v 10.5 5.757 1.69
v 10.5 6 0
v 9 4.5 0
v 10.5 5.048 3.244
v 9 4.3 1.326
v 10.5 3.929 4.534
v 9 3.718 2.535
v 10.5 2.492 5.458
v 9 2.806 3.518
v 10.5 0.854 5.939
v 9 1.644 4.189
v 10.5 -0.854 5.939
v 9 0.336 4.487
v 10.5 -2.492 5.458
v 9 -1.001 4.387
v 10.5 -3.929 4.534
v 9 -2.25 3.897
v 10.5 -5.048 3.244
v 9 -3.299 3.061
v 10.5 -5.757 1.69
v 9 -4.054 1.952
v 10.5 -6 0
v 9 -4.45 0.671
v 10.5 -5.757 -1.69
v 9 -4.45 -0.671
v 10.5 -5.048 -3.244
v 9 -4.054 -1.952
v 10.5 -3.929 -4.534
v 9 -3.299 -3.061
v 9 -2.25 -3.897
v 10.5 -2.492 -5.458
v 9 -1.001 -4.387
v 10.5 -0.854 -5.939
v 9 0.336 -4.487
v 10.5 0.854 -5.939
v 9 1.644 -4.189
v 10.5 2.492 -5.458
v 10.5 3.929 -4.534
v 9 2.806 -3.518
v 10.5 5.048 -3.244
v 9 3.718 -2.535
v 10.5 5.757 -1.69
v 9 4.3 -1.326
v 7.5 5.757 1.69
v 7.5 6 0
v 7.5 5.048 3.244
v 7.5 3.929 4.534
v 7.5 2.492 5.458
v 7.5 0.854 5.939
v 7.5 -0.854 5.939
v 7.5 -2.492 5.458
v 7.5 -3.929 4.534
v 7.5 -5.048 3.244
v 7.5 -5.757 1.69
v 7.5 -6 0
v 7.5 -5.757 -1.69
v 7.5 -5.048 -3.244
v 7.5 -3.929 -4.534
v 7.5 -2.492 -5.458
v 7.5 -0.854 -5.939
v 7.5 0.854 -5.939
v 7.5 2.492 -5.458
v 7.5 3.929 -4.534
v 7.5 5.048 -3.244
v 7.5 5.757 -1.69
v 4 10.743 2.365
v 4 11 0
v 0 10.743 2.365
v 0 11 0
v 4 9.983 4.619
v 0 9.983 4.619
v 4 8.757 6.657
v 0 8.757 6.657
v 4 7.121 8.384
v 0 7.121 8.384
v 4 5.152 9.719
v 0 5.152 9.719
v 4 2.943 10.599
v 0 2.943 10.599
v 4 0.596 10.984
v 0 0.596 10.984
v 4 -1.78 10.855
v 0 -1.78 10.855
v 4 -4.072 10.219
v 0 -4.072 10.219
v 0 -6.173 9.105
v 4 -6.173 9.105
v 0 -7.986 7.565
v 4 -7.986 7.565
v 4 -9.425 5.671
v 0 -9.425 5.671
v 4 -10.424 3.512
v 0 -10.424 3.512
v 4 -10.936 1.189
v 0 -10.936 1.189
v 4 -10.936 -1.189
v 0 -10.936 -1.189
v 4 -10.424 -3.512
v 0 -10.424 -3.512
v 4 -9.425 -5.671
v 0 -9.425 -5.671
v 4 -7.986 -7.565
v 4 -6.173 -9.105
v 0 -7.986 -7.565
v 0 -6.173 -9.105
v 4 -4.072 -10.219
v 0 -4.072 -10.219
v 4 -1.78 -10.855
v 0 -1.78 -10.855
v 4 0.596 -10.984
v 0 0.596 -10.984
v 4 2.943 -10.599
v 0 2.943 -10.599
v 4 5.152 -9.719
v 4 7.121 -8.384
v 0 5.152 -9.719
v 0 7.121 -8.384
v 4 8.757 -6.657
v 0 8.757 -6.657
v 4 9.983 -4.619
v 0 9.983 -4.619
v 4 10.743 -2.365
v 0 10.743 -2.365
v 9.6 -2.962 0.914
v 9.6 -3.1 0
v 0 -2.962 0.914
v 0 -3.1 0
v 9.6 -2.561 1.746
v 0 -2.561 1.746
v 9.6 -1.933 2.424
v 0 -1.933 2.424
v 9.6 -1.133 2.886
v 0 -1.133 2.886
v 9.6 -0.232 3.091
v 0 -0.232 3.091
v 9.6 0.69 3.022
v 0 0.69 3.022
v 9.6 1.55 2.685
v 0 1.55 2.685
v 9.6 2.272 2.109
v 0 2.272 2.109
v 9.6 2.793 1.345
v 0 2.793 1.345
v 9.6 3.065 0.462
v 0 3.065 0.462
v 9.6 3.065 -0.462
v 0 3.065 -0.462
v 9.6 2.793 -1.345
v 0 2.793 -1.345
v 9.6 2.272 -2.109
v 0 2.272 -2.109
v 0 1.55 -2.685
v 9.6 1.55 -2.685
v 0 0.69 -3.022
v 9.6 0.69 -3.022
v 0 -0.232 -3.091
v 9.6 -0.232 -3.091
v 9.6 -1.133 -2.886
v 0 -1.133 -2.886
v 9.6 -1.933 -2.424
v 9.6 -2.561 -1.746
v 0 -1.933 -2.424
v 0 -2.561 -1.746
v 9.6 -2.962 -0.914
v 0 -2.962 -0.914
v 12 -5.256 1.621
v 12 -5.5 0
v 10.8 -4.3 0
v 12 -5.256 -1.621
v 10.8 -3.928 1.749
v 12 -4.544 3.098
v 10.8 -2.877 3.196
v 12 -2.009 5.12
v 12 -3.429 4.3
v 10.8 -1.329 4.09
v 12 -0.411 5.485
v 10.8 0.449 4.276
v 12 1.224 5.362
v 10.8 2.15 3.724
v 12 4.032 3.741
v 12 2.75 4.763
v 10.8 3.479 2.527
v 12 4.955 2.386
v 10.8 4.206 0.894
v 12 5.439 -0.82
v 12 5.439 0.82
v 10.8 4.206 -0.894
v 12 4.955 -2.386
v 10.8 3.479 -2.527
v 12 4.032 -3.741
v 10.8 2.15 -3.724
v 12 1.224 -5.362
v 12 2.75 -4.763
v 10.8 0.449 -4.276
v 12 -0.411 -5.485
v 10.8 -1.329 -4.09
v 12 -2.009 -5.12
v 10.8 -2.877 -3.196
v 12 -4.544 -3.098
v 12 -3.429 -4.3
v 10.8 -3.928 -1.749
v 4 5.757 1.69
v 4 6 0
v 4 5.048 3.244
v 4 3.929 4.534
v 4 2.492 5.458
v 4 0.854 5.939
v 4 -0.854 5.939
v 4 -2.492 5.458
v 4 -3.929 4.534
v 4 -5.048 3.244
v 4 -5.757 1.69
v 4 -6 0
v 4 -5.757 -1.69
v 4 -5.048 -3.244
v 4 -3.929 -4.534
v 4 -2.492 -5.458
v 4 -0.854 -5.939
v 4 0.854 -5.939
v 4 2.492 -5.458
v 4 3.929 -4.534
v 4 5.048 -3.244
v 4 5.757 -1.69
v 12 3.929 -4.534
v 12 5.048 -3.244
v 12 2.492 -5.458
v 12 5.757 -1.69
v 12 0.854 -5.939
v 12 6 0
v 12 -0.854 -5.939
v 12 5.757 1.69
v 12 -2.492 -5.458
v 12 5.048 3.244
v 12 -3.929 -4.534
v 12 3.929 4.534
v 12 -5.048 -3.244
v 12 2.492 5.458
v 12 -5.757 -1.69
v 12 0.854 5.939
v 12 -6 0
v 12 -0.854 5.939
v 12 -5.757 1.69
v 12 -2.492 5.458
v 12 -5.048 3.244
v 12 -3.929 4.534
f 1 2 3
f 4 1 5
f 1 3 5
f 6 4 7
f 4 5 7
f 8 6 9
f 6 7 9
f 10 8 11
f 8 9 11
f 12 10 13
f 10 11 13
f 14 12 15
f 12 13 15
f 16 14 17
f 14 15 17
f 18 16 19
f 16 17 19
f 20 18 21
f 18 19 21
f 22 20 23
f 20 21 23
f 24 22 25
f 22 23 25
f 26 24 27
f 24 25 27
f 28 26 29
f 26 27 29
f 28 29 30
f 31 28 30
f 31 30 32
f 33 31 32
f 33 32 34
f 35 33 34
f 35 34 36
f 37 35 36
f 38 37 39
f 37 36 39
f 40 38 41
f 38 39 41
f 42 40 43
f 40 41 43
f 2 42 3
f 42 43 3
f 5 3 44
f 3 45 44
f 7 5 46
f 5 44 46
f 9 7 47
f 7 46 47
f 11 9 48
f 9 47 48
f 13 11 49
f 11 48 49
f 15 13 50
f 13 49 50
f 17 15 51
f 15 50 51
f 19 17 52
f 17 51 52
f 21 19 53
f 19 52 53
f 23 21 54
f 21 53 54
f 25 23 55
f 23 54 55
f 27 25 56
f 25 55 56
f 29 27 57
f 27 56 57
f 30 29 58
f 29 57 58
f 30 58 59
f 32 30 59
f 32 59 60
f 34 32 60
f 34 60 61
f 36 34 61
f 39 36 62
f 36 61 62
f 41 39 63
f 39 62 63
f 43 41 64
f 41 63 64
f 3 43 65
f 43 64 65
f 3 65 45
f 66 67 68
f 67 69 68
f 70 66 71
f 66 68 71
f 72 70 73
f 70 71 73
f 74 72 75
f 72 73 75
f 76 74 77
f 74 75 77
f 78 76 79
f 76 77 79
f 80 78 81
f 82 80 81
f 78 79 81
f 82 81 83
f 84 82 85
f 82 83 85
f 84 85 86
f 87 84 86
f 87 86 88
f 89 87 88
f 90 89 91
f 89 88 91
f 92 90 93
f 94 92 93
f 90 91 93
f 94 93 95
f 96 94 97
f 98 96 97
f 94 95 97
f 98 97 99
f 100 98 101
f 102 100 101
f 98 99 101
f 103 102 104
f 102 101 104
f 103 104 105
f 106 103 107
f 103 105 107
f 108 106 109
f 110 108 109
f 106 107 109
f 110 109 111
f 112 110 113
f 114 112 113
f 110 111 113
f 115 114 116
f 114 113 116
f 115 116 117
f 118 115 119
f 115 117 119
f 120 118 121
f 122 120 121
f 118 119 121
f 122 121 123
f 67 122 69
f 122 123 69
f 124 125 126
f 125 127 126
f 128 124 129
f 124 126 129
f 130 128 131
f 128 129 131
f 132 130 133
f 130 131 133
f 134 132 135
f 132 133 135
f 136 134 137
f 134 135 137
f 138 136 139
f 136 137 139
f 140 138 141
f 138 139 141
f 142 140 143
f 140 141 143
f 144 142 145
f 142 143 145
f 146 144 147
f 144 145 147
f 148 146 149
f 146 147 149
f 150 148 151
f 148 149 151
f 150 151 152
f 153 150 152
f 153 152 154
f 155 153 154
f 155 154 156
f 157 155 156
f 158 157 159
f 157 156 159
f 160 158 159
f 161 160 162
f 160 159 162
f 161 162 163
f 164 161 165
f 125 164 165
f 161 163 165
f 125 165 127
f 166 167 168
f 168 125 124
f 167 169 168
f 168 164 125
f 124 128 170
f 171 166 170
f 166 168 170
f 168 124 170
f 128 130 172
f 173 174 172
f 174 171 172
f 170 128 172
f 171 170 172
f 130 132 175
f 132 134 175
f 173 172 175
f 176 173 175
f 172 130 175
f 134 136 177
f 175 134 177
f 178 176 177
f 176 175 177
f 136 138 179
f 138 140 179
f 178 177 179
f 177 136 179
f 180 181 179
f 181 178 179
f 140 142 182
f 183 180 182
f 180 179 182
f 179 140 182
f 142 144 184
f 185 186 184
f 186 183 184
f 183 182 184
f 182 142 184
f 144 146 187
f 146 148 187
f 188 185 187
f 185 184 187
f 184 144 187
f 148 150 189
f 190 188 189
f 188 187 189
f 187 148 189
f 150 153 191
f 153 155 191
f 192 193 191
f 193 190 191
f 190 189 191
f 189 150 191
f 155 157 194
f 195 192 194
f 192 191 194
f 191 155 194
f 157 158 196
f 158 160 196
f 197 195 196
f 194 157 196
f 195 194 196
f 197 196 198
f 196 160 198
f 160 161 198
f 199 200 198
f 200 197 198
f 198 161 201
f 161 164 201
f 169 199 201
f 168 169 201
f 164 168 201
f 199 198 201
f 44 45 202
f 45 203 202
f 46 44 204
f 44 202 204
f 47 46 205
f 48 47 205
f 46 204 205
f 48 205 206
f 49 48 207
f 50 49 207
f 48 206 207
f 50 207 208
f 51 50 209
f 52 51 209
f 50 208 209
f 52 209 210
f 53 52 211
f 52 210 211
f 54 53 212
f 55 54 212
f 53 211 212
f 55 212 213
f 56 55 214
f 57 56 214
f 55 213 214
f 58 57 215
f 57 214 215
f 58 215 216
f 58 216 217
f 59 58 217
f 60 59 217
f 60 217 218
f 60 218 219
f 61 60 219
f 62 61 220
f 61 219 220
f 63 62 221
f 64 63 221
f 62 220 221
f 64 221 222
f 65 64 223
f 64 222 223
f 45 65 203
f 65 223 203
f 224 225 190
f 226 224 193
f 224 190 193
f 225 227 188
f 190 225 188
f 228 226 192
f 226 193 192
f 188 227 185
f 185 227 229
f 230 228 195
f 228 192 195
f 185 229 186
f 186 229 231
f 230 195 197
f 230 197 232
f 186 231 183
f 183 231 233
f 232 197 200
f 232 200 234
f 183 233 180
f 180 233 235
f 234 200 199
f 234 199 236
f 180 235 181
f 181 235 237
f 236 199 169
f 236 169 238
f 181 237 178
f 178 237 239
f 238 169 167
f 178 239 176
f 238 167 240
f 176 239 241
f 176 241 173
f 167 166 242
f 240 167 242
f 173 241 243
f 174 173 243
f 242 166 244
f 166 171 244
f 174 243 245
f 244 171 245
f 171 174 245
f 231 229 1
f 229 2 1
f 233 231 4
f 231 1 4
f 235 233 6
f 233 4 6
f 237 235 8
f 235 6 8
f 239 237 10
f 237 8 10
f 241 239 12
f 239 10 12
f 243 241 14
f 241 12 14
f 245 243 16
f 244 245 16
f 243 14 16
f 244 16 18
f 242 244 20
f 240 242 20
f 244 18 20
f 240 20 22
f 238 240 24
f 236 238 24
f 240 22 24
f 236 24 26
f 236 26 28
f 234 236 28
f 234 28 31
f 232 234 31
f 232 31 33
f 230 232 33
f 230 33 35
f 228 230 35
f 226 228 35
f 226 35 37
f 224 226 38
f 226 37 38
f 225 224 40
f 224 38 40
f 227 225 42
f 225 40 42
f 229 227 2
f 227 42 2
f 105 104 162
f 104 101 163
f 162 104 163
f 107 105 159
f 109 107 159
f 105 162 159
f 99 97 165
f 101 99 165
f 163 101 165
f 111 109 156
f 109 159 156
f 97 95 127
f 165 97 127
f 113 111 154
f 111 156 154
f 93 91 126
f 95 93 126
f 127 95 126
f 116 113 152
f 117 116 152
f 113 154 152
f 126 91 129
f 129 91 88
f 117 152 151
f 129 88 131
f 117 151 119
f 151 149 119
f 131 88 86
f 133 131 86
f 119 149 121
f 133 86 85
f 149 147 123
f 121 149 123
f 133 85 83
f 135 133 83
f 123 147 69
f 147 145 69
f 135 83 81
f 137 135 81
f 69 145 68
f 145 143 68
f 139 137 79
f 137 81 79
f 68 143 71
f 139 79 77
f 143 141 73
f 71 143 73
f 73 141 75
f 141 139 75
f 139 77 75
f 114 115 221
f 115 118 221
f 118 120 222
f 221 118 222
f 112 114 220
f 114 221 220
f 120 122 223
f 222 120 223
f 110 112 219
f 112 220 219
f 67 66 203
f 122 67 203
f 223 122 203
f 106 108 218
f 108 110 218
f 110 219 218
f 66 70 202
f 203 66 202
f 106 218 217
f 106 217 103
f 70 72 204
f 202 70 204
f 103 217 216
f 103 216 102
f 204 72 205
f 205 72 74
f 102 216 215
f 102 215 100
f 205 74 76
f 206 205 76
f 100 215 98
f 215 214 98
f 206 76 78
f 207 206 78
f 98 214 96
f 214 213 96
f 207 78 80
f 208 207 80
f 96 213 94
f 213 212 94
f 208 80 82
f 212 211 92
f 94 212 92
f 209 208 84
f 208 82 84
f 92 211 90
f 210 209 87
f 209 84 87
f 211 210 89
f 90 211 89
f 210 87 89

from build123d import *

# Parameters (mm, degrees)
F3_D           = 6.2
F3_CSINK_D     = 11
F3_CSINK_ANGLE = 90


with BuildPart() as f1:
    # F0 (on Top) → F1 (revolve)
    with BuildSketch(Plane.XY):
        Polygon((0, 11), (0, 0), (12, 0), (12, 6), (10.5, 6), (9, 4.5), (7.5, 6), (4, 6), (4, 11), align=None)
    revolve(axis=Axis((6, 0, 0), (1, 0, 0)))

    # F3 (through all)
    with Locations(Plane.YZ.offset(12)):
        with Locations((0, 0)):
            CounterSinkHole(F3_D / 2, F3_CSINK_D / 2, counter_sink_angle=F3_CSINK_ANGLE)


solid = f1.part
